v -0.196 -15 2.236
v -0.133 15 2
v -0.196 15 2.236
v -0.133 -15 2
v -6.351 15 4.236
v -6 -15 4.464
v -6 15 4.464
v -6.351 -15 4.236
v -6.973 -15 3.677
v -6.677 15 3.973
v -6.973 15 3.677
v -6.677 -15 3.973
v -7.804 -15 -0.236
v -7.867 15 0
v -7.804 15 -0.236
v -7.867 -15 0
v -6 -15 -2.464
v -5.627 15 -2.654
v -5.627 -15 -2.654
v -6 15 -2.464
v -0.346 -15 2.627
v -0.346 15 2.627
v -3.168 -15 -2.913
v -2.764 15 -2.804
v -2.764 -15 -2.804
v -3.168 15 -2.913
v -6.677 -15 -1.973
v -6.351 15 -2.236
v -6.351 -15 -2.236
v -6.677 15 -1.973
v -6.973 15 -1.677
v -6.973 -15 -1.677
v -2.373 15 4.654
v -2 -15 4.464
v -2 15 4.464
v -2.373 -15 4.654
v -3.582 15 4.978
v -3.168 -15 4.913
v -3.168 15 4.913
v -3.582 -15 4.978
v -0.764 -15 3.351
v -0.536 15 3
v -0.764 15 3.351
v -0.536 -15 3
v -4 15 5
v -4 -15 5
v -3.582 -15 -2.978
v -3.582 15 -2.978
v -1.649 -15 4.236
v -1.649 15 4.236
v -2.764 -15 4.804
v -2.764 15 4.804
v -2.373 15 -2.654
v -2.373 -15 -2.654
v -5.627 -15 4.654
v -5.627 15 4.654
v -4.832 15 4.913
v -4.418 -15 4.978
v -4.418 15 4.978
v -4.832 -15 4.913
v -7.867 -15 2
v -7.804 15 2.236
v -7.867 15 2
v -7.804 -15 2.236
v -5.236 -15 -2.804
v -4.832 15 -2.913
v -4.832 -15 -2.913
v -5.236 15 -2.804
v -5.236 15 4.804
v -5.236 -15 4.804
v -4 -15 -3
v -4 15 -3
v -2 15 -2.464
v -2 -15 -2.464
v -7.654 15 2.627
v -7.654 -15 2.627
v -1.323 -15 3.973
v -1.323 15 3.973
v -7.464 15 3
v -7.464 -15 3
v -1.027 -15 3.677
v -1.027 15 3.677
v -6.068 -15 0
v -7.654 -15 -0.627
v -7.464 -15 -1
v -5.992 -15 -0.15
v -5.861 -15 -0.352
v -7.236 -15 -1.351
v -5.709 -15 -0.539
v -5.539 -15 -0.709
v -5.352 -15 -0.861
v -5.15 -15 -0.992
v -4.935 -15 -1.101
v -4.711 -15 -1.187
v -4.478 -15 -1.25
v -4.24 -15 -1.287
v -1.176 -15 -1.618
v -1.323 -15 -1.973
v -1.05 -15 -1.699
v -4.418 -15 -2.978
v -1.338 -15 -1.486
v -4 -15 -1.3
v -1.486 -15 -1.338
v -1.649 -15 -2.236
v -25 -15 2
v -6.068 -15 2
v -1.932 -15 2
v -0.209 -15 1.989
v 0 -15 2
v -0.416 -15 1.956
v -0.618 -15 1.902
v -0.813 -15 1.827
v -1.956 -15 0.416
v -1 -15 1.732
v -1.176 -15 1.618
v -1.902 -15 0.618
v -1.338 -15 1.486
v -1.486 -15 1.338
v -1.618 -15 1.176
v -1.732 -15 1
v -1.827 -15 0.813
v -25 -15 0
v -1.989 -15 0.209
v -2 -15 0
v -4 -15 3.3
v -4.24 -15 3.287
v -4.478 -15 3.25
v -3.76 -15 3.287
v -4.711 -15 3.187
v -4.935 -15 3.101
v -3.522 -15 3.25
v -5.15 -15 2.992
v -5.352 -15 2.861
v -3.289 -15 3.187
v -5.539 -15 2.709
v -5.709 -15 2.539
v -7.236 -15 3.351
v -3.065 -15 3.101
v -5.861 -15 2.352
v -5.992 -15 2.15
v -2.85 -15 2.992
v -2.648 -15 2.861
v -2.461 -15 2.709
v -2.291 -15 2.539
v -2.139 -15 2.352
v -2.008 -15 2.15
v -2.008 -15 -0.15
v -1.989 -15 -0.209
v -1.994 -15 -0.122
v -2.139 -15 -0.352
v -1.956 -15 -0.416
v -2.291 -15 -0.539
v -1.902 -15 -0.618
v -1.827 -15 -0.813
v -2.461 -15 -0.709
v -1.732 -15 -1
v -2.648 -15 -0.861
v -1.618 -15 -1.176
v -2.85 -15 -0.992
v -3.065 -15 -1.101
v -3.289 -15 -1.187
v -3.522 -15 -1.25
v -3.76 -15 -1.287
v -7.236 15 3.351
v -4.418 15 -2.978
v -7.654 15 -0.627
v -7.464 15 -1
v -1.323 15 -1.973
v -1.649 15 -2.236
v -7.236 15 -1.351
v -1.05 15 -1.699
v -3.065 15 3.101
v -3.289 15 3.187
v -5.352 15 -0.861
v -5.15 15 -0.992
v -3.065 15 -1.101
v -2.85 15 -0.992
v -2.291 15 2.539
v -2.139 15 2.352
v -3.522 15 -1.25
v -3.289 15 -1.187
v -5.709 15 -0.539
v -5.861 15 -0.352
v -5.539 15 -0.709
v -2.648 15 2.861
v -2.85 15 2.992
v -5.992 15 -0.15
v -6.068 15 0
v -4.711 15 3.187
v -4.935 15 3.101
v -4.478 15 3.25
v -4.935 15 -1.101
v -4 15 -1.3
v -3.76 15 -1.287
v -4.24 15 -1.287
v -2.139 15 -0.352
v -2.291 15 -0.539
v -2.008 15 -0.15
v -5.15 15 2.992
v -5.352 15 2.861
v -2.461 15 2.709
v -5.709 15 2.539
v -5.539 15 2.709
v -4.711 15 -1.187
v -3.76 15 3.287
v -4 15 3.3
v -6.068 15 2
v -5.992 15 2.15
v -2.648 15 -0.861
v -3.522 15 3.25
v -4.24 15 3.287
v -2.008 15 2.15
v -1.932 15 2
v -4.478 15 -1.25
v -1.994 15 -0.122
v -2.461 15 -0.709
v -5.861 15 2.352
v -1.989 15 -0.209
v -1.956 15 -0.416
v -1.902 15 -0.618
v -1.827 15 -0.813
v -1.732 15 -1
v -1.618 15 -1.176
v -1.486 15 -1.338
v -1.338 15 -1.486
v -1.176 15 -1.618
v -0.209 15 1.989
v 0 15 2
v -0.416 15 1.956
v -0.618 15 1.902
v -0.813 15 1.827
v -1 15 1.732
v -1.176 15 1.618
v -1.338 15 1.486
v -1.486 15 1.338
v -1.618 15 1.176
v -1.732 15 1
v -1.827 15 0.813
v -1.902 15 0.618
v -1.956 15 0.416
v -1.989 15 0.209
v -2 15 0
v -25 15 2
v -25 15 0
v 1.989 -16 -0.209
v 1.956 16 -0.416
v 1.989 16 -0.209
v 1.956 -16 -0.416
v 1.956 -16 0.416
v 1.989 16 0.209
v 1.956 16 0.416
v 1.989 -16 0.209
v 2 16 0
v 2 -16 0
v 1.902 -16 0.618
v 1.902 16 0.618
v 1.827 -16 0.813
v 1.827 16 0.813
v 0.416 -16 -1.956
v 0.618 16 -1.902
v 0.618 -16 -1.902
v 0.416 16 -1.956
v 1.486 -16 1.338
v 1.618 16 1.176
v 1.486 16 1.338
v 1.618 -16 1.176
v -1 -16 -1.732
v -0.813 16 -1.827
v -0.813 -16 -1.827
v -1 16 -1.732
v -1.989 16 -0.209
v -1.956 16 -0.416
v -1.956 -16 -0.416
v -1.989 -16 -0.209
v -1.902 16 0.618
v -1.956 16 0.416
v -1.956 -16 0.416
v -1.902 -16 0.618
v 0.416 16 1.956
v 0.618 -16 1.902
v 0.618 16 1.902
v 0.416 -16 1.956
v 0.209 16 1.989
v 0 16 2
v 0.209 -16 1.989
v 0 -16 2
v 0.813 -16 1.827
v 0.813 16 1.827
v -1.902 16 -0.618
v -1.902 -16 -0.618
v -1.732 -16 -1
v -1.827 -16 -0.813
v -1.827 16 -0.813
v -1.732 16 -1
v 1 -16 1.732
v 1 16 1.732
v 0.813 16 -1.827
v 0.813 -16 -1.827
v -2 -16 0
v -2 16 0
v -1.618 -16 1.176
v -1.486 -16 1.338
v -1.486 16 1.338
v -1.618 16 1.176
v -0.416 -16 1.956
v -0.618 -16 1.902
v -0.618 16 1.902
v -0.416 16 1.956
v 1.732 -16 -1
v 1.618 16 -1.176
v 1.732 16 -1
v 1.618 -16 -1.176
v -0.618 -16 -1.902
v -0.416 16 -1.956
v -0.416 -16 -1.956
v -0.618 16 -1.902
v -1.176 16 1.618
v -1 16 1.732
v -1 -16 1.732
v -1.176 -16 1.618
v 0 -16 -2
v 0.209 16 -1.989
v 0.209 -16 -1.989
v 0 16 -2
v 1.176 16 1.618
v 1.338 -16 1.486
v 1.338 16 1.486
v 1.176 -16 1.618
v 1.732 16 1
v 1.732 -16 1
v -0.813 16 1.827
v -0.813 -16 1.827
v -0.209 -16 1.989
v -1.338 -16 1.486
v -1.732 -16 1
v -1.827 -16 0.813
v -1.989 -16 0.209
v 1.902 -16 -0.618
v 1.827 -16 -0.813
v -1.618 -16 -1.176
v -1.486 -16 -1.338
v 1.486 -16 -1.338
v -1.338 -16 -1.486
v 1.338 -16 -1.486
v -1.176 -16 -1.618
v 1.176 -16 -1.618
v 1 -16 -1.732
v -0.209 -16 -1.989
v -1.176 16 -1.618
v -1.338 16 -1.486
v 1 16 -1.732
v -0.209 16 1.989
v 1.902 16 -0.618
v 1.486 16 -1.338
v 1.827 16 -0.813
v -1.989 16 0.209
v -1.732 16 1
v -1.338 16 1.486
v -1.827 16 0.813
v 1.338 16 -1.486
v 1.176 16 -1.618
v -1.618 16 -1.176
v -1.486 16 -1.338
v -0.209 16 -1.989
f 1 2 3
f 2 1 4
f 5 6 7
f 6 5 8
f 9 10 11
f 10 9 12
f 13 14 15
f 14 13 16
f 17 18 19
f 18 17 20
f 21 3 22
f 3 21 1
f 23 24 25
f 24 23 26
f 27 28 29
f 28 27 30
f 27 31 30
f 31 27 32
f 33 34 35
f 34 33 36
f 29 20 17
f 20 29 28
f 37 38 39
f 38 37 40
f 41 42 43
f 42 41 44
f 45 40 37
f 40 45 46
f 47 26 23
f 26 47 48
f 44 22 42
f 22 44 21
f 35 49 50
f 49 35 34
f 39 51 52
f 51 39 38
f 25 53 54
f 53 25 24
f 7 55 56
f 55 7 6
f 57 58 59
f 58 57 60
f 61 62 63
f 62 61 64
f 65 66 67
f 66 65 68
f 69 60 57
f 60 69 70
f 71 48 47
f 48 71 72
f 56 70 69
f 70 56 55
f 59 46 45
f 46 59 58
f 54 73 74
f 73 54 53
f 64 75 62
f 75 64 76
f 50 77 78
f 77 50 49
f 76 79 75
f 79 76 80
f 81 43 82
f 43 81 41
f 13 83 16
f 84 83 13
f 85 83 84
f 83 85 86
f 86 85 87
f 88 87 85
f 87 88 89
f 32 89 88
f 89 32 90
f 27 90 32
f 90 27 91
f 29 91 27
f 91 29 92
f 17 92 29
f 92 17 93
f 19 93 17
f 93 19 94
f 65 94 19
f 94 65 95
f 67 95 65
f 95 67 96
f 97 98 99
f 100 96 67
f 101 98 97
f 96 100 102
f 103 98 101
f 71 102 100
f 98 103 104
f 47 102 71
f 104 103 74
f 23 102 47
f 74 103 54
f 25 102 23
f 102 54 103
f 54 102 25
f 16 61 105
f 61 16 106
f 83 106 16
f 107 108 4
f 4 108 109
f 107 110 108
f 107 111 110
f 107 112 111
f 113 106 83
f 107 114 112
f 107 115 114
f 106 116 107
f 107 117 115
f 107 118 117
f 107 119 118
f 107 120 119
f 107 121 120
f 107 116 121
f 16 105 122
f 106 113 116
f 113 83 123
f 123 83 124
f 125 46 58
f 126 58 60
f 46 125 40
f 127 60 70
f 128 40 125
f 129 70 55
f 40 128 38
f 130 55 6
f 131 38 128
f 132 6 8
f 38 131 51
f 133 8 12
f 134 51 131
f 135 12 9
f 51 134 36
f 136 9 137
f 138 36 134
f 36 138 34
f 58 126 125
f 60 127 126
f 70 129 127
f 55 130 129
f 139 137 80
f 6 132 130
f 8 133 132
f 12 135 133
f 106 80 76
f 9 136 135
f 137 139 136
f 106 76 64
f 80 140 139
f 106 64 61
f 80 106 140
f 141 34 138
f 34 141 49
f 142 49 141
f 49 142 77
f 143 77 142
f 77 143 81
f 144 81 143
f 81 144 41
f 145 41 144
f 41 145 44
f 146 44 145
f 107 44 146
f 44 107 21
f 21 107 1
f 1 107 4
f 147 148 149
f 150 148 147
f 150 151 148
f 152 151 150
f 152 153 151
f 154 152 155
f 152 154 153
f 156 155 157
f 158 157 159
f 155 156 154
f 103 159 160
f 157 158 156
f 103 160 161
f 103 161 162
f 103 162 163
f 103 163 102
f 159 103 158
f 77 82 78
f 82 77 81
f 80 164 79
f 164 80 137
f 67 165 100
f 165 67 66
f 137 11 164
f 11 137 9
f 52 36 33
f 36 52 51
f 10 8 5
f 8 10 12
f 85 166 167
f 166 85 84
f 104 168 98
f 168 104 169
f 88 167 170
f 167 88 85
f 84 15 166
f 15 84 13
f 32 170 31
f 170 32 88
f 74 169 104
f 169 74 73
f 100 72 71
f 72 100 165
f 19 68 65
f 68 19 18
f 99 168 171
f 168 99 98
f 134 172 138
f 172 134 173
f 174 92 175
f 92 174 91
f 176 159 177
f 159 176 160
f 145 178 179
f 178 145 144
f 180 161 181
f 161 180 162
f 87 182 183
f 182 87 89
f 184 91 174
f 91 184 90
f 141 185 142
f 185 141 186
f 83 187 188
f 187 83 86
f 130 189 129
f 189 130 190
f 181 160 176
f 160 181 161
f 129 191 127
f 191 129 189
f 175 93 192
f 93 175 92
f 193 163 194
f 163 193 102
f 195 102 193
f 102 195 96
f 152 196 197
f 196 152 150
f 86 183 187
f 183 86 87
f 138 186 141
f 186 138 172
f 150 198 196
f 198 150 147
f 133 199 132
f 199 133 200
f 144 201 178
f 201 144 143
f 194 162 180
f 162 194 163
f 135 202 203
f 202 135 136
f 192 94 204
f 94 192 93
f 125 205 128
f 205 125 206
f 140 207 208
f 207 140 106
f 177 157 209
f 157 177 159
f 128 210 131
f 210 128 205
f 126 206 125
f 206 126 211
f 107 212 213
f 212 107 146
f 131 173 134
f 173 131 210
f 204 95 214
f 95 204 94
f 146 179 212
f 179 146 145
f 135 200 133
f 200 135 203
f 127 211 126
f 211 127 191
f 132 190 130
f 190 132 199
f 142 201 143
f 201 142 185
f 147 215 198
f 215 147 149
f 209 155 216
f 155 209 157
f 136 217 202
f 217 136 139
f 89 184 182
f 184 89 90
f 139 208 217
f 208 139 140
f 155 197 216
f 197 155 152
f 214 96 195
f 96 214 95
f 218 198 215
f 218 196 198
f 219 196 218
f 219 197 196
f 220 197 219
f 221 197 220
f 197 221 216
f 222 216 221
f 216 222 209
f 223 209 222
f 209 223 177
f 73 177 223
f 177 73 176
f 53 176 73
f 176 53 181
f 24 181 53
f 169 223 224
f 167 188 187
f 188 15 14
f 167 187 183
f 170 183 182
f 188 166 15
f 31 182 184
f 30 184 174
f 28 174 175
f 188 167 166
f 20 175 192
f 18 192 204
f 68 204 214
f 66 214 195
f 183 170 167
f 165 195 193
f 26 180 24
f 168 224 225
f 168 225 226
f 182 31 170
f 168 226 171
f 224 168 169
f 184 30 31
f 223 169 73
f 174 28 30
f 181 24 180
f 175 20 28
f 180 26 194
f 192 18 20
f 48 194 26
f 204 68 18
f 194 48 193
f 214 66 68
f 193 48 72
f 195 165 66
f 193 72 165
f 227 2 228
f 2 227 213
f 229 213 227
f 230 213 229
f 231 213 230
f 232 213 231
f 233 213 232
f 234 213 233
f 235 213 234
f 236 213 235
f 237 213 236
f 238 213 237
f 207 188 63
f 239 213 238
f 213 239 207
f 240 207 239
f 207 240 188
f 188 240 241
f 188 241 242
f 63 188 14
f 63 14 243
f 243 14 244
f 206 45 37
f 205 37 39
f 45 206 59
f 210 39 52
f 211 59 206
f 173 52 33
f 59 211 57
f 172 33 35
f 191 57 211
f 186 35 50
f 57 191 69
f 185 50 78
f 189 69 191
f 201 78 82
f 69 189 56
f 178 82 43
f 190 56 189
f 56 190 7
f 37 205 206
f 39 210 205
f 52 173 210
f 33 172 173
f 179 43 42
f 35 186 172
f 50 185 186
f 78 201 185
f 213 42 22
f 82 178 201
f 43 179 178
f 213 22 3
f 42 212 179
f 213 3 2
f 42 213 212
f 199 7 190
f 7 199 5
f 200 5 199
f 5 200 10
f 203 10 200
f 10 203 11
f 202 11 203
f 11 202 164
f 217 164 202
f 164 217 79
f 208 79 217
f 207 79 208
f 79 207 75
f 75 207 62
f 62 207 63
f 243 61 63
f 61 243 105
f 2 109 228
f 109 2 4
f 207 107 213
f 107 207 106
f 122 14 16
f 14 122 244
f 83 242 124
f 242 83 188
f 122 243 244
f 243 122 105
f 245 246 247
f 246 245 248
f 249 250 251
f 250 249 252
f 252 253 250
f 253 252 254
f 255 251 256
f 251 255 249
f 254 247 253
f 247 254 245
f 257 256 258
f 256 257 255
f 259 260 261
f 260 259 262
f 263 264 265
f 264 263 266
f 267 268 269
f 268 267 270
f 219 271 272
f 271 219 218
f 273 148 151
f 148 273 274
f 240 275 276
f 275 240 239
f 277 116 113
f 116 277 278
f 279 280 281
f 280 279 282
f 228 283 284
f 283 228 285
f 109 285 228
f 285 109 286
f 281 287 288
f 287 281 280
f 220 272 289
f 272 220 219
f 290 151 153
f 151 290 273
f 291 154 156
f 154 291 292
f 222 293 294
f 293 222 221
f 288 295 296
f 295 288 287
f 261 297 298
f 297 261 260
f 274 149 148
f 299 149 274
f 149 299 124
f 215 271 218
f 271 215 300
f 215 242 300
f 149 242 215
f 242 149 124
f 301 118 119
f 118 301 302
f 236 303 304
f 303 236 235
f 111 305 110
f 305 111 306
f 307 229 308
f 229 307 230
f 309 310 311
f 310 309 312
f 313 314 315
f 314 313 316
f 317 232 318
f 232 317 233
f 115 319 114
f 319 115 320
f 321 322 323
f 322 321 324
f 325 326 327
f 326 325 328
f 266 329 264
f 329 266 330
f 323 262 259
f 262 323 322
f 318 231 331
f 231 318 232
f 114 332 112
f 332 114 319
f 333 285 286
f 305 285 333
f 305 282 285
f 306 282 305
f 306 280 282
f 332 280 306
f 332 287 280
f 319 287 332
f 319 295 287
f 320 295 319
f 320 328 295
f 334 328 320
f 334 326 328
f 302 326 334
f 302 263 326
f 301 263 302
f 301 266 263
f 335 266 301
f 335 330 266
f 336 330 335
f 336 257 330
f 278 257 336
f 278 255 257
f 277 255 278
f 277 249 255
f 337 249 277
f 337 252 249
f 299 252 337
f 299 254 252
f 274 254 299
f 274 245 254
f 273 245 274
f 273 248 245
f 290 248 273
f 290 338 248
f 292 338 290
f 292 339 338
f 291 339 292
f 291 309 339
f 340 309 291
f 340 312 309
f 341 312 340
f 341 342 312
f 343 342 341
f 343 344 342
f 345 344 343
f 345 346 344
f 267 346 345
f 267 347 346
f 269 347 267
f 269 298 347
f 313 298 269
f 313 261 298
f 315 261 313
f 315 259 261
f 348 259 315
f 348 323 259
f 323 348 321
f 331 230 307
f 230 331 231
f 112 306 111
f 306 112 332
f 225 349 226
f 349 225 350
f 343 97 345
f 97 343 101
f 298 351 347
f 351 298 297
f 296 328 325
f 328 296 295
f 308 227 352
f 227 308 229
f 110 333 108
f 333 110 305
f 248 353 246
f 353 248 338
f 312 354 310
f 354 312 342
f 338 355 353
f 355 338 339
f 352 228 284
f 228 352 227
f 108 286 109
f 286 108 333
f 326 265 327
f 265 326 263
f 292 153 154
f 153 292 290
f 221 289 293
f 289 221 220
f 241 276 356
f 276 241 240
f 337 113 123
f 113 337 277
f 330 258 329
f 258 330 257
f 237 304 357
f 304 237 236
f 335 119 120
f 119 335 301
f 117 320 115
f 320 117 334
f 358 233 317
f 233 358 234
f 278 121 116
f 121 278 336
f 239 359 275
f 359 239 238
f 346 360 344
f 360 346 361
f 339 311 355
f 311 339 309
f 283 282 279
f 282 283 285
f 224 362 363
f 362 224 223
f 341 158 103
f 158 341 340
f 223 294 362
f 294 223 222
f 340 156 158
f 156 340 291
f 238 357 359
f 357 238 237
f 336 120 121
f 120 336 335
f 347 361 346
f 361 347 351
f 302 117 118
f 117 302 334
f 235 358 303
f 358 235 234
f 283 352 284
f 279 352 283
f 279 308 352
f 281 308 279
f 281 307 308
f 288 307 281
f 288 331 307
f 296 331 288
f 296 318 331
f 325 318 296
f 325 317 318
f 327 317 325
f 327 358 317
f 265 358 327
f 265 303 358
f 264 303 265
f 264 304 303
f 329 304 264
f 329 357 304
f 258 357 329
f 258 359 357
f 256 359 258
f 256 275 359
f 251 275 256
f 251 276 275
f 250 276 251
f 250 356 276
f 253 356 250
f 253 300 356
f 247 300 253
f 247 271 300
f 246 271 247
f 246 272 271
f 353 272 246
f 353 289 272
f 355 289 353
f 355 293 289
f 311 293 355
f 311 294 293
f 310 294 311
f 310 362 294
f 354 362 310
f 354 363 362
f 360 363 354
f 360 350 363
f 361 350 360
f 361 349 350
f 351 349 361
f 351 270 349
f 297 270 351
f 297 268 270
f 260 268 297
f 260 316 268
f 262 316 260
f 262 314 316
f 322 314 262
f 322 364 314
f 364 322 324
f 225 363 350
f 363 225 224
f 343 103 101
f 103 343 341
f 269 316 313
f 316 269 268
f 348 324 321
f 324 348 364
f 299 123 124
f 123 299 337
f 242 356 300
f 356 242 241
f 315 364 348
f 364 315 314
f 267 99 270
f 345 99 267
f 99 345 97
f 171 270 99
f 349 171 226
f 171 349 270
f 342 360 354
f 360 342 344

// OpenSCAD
// 修正点: knuckle の長さを各セグメント6mmに修正、180°開放時の回転軸をヒンジ軸（X=0, Z中心線）周りに適用するよう修正
// 左板/右板/ピン軸を組み合わせた完成品(180°開き)を1ファイル内で出力

// 基本寸法
leaf_W = 25;      // 板の横幅 (X方向)
leaf_H = 30;      // 縦寸法 (Y方向)
leaf_T = 2;       // 厚さ (Z方向)

// knuckle / ピン
knuckle_OD = 8;     // 外径
knuckle_R  = knuckle_OD/2;
hole_d     = 4.6;   // knuckle 内径（ピン軸 + 0.3mmクリアランス）
hole_R     = hole_d/2;
pin_D      = 4;     // ピン径
pin_R      = pin_D/2;

// knuckle の Y 方向分割（各セグメントの長さは 6mm）
left_knuckles_Y  = [-12, 0, 12];  // 左板: 外側2個 + 中央1個
right_knuckles_Y = [-6, 6];       // 右板: 中間2個

// knuckle から離れた側の皿穴（M3）
M3_pocket_Y_left  = [-12, -4, 4];
M3_pocket_Y_right = [-12, -4, 4];

// 左板/右板の位置
// 左板: X ∈ [-25, 0], Y ∈ [-15, 15], Z ∈ [0, 2]
// 右板: X ∈ [0, 25],  Y ∈ [-15, 15], Z ∈ [0, 2]
$fn = 60;

// knuckle: 左右それぞれのセグメントを X 軸方向に -4/+4 にずらして配置
module hollow_knuckle(isLeft, y) {
    x = isLeft ? -4 : 4;
    translate([x, y, 1])
        rotate([90, 0, 0])
            // 各セグメントは長さ6mm
            difference() {
                // 外筒
                cylinder(h = 6, r = knuckle_R, center = true);
                // 内穴 (ピン軸 + 0.3mm クリアランス = 4.6mm)
                cylinder(h = 6, r = hole_R, center = true);
            }
}

// M3 皿穴 + テーパ付き countersink
module m3_hole_at(x, y) {
    // countersink: 表面から depth 1mm, diameter 6mm
    translate([x, y, leaf_T - 1])
        cylinder(h = 1, r1 = 3, r2 = 0, center = false);

    // 貫通穴: 直径 3.2mm
    translate([x, y, 0])
        cylinder(h = leaf_T, r = 1.6, center = false);
}

// 左板（X<0）
module left_leaf() {
    union() {
        // 左板本体
        translate([-25, -15, 0])
            cube([25, 30, 2], center = false);

        // knuckle（左板: 外側2個 + 中央1個）
        for (y = left_knuckles_Y)
            hollow_knuckle(true, y);

        // knuckle から離れた側の M3 皿穴
        for (y = M3_pocket_Y_left)
            m3_hole_at(-20, y);
    }
}

// 右板（X>0）
module right_leaf() {
    union() {
        // 右板本体
        translate([0, -15, 0])
            cube([25, 30, 2], center = false);

        // knuckle（右板: 中間2個）
        for (y = right_knuckles_Y)
            hollow_knuckle(false, y);

        // knuckle から離れた側の M3 皿穴
        for (y = M3_pocket_Y_right)
            m3_hole_at(20, y);
    }
}

// ピン軸（Y軸方向、+Y 方向に伸びる）
module pin_axis() {
    rotate([90, 0, 0])
        cylinder(h = 32, r = pin_R, center = true);
}

// 完成した180°開きの状態
module hinge_open_state() {
    // 左板を固定
    left_leaf();

    // 右板をヒンジ軸を中心に180°開くよう回転（X=0, Z=leaf_T/2 を基準に回転軸を設定）
    translate([0, 0, leaf_T/2])
        rotate([0, 180, 0])
            translate([0, 0, -leaf_T/2])
                right_leaf();

    // ピン軸
    pin_axis();
}

hinge_open_state();
